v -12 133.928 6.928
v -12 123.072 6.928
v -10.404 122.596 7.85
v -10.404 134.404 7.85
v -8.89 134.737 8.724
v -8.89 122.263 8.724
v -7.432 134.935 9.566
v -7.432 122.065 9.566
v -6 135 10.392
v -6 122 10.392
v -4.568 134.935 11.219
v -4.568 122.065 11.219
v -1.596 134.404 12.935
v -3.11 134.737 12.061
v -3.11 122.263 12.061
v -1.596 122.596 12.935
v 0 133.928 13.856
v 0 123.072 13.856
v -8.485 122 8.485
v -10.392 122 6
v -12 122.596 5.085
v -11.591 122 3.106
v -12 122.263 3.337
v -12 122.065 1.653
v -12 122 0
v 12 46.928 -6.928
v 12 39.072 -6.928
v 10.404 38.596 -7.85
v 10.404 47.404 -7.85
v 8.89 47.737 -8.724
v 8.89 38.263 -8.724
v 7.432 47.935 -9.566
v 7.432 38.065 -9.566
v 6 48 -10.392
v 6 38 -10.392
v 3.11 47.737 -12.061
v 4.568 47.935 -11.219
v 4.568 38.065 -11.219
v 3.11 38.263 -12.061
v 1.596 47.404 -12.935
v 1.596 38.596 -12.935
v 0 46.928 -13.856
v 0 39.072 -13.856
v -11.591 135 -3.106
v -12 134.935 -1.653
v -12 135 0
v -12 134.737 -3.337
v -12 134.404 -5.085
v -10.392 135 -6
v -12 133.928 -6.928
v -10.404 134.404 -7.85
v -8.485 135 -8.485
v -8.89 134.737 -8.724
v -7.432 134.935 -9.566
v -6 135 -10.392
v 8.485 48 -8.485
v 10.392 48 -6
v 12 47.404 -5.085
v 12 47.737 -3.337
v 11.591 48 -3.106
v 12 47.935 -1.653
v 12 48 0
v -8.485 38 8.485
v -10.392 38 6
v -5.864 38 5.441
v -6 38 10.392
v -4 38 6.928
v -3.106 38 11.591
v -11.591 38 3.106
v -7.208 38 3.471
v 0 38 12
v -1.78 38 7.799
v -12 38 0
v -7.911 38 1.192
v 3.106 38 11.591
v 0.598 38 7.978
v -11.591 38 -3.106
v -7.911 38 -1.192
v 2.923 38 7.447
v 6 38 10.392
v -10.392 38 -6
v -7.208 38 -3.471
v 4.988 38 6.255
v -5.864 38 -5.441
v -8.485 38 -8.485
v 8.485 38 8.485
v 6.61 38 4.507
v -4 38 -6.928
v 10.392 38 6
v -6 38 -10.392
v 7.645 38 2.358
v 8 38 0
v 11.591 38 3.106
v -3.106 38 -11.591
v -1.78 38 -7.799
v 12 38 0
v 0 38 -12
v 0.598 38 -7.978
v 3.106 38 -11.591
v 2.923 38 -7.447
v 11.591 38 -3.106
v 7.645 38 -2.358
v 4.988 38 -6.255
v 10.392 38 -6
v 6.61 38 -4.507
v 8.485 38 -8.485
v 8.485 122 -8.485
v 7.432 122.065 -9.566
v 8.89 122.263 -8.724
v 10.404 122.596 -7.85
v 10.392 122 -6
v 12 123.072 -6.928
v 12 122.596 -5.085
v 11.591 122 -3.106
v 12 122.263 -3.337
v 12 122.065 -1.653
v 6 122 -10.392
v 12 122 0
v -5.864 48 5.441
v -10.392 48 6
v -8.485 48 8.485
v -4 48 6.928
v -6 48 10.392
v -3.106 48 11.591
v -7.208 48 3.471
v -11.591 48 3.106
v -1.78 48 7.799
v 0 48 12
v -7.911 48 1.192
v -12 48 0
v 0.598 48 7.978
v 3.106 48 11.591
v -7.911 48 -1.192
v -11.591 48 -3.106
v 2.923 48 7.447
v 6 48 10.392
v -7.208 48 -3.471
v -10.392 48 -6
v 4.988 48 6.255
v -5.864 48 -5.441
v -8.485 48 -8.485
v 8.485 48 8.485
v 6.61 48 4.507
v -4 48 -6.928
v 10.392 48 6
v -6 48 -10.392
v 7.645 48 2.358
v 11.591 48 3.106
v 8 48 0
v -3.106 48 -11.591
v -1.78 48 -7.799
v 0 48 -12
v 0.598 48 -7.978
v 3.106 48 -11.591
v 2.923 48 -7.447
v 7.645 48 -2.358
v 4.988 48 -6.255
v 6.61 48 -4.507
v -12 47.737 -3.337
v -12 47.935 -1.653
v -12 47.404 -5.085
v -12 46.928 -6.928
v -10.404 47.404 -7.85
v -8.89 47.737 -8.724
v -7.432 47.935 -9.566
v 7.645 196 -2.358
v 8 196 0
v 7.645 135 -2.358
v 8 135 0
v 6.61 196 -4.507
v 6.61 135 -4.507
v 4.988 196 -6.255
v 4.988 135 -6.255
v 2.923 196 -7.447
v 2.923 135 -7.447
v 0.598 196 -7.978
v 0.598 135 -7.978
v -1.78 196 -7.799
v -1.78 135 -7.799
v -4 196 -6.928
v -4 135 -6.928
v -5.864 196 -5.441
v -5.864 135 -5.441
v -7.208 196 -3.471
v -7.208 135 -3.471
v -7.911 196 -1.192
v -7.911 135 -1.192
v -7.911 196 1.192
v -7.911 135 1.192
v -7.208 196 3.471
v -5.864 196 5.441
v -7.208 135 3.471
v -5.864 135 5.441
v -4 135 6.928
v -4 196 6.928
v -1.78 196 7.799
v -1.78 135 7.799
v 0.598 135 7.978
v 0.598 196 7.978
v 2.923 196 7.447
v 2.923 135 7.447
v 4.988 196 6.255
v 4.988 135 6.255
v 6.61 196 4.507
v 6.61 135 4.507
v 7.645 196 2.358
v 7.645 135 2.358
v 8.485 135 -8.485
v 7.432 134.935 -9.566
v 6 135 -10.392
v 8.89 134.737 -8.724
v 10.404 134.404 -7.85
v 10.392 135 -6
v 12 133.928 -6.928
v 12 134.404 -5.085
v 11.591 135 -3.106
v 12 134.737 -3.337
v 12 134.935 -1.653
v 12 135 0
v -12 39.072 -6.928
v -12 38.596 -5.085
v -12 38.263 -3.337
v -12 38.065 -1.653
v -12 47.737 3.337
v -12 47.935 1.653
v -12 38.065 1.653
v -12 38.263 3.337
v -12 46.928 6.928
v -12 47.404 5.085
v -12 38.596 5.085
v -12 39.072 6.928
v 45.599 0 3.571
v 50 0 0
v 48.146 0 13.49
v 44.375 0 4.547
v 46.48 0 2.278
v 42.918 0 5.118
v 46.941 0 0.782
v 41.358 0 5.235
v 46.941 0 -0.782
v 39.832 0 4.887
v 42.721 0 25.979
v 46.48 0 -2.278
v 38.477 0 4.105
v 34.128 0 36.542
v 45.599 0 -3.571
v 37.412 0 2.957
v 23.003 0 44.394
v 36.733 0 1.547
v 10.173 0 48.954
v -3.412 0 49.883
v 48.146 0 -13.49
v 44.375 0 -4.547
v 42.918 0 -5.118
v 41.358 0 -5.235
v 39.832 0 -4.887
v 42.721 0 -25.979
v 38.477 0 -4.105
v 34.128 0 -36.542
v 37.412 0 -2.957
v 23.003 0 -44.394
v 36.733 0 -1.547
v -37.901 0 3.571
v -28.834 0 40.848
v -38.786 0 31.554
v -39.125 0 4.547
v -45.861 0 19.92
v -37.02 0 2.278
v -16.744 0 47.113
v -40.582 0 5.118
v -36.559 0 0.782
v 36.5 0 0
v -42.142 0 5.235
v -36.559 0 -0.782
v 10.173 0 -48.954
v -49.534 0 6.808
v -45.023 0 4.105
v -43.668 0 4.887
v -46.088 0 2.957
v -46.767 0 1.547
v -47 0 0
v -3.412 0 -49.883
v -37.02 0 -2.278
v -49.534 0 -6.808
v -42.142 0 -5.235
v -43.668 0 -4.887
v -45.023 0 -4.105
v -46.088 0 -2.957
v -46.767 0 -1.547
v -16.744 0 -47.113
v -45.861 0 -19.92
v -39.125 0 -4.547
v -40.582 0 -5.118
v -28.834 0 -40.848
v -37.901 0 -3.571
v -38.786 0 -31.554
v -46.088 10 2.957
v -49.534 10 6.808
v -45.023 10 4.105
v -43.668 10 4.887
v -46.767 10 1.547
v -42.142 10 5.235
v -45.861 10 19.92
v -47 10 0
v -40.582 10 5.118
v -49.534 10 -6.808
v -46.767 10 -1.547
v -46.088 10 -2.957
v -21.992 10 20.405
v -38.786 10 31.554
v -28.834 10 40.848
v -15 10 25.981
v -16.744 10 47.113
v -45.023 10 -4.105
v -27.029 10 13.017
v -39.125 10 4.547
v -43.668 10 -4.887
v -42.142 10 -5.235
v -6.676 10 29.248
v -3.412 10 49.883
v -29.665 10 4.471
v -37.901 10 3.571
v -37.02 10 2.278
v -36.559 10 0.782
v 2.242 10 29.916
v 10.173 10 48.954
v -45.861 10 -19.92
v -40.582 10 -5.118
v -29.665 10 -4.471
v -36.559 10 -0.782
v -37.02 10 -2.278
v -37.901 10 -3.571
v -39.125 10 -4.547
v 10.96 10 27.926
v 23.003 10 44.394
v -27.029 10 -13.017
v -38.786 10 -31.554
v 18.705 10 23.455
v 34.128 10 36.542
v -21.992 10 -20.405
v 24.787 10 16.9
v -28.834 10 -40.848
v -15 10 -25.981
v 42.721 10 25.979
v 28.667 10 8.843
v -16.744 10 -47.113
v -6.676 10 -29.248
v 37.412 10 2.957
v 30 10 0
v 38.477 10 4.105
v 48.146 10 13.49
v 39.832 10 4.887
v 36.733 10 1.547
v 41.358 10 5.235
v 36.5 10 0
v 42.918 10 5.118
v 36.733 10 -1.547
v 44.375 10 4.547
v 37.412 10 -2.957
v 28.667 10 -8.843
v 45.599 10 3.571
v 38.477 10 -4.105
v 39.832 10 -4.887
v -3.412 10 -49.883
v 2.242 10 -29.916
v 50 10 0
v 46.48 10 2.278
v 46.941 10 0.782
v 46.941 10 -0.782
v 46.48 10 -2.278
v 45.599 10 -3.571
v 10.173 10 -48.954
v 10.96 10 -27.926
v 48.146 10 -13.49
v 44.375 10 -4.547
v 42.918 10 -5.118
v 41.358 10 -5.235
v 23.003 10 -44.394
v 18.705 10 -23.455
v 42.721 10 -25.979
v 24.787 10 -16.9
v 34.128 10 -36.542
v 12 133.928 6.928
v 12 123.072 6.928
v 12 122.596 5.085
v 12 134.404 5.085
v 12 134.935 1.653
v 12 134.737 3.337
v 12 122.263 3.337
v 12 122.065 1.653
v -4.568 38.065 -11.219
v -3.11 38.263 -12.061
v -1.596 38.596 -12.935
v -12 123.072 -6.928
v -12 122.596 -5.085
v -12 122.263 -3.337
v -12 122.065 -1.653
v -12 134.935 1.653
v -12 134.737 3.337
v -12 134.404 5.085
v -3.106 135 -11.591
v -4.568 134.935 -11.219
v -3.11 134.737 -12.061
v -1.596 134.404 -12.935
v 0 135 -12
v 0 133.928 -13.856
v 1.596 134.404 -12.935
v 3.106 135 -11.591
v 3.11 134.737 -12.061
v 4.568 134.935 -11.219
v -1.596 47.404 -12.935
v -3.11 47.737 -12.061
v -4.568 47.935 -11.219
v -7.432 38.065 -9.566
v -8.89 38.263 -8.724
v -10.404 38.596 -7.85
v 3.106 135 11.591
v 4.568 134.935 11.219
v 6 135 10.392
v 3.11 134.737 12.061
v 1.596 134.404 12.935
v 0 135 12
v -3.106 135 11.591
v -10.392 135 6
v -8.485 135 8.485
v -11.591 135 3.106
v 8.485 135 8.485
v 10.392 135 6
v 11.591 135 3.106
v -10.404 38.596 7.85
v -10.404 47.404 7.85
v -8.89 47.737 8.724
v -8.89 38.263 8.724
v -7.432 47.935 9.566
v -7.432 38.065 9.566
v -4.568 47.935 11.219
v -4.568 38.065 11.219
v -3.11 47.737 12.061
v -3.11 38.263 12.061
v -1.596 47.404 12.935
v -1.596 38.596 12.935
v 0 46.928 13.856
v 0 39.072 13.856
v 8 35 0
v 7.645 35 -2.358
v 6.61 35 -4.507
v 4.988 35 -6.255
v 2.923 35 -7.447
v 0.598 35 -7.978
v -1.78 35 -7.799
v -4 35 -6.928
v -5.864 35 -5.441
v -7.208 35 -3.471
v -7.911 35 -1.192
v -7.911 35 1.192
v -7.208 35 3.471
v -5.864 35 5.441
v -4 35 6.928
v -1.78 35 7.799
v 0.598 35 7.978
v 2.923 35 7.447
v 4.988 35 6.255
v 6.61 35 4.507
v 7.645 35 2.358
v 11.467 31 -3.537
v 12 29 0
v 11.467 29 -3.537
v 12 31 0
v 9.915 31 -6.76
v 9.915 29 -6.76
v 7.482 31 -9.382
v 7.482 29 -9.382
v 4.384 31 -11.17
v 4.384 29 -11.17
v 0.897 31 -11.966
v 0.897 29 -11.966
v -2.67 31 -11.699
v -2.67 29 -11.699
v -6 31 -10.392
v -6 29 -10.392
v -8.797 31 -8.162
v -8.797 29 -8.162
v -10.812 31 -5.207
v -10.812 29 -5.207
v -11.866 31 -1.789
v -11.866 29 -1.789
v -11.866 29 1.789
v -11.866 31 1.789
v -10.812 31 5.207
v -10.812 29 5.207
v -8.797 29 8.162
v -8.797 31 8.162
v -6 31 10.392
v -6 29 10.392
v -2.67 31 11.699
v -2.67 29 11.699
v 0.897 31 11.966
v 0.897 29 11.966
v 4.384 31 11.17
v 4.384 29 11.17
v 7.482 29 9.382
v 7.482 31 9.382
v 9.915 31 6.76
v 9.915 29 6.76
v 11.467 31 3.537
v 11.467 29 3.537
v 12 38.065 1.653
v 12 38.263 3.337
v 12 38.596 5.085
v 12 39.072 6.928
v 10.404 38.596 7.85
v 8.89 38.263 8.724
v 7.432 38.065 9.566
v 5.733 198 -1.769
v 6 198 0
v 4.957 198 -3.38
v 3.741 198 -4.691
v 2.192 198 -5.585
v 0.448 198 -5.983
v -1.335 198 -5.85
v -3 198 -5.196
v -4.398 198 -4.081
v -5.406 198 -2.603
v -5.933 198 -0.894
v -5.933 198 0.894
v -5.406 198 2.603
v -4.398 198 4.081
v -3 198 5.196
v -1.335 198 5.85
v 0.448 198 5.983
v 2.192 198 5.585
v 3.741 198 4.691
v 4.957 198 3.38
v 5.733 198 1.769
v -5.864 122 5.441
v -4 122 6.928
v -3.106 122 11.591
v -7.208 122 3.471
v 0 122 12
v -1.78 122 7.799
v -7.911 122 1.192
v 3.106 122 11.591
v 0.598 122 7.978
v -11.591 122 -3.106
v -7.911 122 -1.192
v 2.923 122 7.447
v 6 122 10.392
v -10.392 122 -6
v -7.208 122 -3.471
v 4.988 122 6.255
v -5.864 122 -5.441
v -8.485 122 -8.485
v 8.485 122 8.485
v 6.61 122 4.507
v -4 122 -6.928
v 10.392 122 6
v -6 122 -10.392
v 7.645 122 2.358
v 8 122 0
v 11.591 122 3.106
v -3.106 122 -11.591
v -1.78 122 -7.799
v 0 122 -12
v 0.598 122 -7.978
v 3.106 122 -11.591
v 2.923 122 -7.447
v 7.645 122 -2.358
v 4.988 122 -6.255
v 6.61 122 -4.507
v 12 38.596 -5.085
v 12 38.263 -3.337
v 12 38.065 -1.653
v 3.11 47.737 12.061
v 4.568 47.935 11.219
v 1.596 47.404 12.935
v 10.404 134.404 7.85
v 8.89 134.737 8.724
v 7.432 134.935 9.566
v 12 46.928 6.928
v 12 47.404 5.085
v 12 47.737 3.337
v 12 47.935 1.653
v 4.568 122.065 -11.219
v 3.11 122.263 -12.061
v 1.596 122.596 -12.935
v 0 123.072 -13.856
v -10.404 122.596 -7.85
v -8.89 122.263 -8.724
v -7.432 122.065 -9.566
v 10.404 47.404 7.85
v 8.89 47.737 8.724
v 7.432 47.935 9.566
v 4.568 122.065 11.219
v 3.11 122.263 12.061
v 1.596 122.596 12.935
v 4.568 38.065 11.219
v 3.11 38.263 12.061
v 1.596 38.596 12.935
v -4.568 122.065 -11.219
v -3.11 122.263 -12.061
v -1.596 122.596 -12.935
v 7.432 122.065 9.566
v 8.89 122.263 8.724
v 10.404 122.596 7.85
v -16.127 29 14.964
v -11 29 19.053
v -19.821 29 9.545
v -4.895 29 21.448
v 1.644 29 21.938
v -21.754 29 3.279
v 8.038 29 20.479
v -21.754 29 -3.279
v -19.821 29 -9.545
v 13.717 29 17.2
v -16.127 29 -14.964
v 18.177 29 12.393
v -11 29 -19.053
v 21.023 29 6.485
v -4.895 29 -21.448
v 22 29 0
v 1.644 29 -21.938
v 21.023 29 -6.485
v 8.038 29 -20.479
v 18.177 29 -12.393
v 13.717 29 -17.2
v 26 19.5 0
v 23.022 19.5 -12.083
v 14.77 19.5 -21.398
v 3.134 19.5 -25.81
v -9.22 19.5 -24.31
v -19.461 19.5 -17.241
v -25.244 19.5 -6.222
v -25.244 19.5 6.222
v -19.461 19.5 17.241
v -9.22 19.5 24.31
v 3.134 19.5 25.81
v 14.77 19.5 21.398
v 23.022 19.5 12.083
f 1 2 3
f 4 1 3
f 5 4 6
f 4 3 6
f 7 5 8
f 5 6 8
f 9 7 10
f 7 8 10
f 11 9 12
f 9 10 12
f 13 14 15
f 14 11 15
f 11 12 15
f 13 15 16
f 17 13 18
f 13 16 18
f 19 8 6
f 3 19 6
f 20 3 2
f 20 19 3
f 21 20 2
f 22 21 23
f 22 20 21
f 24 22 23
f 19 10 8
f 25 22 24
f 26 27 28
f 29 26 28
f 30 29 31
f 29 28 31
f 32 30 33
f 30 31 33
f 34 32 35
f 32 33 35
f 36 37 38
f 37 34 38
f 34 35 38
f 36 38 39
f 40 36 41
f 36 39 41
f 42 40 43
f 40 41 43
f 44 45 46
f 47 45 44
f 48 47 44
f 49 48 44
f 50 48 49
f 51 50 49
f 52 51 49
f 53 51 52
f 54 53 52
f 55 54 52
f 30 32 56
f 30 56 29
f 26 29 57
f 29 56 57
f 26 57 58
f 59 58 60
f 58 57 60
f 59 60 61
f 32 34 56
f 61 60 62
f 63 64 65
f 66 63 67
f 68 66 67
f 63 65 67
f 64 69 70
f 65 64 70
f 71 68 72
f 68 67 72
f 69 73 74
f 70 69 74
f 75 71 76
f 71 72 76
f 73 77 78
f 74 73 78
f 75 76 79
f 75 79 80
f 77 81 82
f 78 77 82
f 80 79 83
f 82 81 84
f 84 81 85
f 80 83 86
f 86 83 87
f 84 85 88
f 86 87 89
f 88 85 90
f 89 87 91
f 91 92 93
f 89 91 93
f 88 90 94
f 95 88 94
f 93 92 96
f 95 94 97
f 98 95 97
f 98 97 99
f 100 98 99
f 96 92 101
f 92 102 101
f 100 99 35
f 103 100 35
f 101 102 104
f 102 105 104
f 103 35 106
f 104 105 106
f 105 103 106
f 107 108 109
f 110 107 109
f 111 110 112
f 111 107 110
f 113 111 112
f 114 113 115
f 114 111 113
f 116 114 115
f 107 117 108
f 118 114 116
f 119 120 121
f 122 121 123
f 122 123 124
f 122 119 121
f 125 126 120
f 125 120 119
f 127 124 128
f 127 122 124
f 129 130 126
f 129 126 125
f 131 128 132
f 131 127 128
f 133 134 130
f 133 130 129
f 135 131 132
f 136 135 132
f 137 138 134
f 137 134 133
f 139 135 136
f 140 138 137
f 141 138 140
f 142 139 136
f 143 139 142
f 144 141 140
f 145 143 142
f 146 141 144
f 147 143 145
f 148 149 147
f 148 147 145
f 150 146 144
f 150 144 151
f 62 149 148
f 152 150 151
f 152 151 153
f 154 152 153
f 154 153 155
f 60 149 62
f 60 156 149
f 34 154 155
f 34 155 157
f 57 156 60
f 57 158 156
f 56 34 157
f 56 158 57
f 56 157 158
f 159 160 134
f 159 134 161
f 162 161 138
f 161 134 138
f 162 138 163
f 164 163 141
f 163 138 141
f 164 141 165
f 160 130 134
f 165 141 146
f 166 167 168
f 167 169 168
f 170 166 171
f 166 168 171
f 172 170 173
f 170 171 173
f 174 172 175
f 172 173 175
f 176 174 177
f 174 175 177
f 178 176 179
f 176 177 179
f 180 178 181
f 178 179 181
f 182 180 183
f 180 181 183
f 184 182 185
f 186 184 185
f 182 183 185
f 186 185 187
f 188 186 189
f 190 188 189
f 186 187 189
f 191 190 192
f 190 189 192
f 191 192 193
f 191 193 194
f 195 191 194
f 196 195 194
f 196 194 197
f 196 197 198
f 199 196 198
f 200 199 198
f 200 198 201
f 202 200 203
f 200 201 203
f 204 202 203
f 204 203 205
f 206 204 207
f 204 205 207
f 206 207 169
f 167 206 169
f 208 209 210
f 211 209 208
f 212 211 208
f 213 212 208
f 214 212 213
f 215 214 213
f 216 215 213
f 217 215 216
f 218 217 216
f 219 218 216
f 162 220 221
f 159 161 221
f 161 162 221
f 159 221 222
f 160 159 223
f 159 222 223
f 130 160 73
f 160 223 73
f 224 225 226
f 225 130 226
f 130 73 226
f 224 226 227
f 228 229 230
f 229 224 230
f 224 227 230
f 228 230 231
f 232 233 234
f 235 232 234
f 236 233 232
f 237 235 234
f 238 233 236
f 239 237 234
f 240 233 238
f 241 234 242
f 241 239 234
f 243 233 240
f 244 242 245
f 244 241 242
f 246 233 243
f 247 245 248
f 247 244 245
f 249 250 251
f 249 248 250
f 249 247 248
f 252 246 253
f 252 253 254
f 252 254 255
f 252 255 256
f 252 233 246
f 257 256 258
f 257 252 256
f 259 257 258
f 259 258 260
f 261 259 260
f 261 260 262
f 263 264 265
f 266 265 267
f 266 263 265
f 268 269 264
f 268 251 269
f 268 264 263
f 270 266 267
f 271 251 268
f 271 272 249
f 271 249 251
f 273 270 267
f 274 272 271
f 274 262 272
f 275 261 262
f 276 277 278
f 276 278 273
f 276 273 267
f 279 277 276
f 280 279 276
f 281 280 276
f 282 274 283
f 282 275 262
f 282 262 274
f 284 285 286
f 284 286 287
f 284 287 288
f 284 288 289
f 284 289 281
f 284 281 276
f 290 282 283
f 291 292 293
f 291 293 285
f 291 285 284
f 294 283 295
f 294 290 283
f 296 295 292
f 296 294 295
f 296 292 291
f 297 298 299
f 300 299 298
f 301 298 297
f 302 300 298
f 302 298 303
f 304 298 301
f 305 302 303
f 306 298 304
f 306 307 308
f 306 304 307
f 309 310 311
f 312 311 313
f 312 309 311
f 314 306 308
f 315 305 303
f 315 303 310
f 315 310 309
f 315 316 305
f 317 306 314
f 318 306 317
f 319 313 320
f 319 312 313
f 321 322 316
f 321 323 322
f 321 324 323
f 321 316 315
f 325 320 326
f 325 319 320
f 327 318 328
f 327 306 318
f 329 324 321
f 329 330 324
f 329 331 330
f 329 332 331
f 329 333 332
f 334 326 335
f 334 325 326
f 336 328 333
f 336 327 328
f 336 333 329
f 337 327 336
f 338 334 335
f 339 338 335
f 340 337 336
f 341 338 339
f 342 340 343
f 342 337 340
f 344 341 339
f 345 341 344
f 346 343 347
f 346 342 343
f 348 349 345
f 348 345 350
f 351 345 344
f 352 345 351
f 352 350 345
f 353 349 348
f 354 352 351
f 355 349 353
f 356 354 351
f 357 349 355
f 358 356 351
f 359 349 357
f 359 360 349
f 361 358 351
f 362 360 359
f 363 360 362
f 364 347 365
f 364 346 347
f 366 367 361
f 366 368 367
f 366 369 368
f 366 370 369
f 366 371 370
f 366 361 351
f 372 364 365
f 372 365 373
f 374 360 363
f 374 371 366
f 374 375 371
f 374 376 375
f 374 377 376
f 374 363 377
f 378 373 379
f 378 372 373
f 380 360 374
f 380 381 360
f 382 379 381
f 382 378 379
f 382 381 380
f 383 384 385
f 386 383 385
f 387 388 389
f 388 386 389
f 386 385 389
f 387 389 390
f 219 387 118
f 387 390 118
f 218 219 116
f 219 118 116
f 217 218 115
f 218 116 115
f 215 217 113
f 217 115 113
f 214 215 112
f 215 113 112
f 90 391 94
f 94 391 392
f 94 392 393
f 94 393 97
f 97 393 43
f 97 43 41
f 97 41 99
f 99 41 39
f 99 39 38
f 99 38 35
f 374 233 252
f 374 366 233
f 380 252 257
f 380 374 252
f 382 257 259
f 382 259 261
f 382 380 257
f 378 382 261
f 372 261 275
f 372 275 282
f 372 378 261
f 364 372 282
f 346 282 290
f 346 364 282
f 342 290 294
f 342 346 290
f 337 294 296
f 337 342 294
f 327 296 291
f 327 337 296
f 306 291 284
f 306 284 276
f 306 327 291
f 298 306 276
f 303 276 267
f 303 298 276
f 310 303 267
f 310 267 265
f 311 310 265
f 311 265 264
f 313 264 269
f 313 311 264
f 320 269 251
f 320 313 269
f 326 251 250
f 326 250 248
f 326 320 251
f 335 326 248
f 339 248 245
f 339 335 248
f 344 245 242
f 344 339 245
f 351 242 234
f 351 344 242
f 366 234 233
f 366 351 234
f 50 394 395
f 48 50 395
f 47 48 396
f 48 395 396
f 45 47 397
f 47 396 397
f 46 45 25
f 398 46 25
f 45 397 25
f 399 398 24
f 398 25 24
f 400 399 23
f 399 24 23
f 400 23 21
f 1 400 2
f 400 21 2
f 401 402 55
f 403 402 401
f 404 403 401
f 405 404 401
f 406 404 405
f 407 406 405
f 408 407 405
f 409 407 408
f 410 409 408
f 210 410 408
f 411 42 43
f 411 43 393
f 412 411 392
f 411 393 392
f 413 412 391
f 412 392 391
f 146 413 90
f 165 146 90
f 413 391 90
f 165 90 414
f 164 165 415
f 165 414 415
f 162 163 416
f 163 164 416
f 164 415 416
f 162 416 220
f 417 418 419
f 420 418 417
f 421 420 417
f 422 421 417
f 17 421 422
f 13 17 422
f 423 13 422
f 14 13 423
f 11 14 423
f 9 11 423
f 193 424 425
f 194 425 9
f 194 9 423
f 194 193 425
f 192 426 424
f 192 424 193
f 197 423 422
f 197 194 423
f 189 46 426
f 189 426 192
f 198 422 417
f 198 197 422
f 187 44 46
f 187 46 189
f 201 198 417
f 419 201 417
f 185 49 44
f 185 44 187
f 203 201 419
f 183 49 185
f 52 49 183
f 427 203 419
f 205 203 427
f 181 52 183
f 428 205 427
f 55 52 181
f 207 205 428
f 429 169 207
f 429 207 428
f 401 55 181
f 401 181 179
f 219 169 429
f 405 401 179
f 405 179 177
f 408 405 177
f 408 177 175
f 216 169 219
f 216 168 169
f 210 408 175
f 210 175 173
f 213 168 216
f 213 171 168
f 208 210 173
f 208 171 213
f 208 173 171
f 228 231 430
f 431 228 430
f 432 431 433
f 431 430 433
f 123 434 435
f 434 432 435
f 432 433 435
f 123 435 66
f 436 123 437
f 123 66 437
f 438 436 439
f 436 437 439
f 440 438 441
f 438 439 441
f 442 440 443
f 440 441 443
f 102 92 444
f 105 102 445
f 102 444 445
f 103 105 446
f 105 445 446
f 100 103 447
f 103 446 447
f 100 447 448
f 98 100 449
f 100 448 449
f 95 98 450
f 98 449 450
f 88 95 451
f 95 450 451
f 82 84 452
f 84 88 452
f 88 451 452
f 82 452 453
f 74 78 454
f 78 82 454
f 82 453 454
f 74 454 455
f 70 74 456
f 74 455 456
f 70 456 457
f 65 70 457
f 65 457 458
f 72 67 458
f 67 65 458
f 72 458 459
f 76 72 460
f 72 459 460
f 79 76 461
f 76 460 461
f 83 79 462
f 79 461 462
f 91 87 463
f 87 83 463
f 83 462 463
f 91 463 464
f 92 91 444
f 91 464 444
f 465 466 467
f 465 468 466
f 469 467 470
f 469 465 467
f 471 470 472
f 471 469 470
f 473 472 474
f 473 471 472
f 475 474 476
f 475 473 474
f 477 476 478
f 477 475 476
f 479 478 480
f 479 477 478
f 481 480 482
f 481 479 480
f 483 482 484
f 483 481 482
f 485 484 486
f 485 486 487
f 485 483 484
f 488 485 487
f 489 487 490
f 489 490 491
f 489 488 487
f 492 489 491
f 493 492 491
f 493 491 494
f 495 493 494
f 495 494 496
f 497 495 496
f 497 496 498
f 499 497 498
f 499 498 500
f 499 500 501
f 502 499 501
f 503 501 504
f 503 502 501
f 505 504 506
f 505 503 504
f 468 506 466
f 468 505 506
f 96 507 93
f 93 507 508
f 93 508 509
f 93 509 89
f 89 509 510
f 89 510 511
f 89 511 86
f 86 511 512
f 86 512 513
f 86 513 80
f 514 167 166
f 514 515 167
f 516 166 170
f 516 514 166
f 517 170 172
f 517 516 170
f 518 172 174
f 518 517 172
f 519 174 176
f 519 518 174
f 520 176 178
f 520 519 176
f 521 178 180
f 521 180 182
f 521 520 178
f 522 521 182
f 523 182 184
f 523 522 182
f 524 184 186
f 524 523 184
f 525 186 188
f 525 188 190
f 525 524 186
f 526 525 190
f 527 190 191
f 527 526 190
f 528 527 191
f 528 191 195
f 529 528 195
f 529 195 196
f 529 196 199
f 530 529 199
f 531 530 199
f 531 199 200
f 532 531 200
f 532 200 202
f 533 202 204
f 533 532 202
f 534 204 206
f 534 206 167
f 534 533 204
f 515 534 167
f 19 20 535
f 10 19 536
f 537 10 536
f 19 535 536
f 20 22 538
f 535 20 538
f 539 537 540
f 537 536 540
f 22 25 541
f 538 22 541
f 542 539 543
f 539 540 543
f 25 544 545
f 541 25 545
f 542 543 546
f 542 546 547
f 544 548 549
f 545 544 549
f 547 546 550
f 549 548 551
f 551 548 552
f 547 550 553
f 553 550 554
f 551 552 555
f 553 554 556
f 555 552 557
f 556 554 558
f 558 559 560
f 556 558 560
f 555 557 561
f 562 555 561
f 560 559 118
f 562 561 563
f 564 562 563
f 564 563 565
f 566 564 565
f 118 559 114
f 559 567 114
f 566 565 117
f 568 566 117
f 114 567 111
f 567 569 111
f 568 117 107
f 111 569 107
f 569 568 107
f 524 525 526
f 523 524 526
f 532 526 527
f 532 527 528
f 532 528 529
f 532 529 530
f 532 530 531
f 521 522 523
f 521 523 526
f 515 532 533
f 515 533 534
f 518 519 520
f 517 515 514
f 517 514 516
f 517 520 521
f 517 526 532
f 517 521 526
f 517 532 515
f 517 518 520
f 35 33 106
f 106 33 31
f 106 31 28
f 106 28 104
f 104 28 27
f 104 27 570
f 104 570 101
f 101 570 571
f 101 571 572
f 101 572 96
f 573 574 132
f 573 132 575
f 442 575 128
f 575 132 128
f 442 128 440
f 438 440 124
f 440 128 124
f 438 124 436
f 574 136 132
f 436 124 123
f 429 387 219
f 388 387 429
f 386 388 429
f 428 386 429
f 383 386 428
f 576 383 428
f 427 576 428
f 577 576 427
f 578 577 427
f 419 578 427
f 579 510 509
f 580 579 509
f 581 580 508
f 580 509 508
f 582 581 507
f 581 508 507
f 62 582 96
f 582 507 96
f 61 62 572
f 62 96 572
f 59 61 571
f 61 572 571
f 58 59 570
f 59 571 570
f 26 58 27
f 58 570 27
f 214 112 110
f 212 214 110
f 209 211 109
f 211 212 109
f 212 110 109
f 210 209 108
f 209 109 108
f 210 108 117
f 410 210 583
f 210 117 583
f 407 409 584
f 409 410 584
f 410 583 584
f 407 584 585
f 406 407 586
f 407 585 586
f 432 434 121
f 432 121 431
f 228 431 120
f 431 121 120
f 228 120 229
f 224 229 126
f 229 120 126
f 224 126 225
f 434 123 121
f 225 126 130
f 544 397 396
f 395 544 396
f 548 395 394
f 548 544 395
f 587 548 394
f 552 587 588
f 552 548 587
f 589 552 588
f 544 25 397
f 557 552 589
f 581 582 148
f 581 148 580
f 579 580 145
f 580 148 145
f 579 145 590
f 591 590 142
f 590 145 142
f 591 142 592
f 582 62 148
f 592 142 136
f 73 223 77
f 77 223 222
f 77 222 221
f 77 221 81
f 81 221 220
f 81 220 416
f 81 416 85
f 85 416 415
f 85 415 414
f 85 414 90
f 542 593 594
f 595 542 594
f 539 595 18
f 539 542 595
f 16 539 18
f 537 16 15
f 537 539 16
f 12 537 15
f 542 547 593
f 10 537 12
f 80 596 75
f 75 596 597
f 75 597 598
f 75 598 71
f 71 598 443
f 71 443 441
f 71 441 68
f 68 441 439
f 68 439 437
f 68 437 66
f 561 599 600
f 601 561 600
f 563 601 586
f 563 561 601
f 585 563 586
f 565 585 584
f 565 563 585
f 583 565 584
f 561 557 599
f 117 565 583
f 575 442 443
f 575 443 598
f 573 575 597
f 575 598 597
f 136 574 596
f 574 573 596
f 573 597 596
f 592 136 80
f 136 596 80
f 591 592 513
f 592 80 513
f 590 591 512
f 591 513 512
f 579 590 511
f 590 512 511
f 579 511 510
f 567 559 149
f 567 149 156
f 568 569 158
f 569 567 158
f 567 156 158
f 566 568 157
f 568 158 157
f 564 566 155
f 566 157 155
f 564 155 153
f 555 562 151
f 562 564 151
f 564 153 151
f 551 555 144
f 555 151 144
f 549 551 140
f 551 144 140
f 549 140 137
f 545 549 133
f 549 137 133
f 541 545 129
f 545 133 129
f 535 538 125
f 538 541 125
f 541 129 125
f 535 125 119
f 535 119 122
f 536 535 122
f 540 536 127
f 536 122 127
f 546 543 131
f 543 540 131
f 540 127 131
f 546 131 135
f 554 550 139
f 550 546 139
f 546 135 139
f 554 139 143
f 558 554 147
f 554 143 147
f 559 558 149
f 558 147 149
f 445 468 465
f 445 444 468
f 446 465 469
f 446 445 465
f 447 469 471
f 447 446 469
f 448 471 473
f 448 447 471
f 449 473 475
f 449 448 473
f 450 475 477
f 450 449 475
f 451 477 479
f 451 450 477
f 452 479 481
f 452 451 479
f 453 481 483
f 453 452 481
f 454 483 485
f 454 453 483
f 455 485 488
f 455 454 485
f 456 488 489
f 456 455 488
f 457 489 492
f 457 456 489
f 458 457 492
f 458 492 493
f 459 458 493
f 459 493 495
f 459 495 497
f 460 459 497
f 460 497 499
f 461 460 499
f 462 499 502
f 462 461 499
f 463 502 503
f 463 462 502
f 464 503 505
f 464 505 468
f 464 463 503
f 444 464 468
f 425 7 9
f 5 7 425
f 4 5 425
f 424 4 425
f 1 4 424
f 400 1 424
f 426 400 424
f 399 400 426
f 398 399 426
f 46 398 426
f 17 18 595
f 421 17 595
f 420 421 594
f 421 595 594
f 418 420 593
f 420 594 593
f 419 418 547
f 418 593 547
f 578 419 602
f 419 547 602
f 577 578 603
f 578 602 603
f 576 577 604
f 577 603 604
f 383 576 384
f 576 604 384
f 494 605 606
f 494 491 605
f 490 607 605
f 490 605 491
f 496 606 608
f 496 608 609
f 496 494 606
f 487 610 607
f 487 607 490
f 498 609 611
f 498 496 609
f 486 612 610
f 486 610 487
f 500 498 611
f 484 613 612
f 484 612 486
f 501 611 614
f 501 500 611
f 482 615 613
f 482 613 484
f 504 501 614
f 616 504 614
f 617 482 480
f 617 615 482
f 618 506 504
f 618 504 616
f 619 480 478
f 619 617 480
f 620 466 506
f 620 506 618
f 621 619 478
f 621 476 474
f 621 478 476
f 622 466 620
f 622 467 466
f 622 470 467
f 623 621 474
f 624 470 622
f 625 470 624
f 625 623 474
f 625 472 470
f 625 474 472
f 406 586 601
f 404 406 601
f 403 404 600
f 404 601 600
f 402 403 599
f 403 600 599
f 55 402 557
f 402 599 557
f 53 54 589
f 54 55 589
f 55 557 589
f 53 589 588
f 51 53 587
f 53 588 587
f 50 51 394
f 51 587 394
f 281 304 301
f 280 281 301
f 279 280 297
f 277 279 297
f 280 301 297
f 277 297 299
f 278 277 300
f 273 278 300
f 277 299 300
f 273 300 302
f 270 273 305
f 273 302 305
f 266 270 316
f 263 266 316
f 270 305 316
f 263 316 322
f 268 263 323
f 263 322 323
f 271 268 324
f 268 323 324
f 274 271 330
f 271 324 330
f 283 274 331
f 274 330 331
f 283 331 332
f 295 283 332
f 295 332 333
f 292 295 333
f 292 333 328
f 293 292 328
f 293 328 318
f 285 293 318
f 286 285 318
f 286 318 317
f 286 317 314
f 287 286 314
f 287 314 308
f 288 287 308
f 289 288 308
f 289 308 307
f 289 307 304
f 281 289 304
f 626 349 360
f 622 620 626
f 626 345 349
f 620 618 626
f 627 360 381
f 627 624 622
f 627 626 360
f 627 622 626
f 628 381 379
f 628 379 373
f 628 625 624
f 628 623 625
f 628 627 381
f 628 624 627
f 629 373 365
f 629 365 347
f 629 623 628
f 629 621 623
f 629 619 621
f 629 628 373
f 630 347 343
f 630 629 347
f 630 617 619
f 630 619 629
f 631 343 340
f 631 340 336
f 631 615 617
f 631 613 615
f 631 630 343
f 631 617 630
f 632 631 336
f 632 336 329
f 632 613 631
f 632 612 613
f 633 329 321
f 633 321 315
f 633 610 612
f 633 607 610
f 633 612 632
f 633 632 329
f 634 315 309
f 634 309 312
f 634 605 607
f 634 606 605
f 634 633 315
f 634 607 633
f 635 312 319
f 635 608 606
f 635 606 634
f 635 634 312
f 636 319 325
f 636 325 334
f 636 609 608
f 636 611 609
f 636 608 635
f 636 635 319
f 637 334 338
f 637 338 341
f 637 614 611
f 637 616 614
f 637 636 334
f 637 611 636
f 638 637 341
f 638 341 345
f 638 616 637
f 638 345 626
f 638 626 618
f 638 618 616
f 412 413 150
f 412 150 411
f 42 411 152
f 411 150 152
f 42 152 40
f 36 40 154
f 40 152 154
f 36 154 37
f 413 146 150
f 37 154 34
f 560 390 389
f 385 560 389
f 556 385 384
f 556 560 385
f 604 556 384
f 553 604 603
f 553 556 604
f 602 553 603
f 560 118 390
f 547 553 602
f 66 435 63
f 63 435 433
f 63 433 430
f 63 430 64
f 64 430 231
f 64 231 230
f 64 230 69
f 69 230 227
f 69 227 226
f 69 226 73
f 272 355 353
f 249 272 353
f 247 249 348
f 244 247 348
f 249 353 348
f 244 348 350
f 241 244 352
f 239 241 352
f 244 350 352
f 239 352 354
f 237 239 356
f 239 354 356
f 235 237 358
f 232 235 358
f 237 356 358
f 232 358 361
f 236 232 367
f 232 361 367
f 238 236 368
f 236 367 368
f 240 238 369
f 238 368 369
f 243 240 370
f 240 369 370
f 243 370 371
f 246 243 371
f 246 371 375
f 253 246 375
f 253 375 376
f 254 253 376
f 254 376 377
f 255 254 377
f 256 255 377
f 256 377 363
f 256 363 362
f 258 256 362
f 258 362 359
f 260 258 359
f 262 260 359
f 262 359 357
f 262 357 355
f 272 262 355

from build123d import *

# Parameters (mm, degrees)
EXTRUDE_1_DEPTH     = 10
EXTRUDE_2_DEPTH     = 13
SKETCH_5_R          = 5.25
CUT_EXTRUDE_1_DEPTH = 11


with BuildPart() as part:
    # Эскиз1 → Повернуть1 (revolve)
    with BuildSketch(Plane.XY, mode=Mode.PRIVATE) as revolve_1_sk:
        Polygon((0, 0), (-50, 0), (-50, 10), (-30, 10), (-22, 29), (-12, 29), (-12, 31), (-8, 35), (-8, 38), (-8, 48), (-8, 196), (-6, 198), (0, 198), align=None)
    revolve(revolve_1_sk.sketch.rotate(Axis((0, 0, 0), (0, 1, 0)), 180), axis=Axis((0, 0, 0), (0, 1, 0)))  # turned: the seam where the file's is

    # Эскиз2 → Бобышка-Вытянуть1 (add)
    with BuildSketch(Plane(origin=(0, 38, 0), x_dir=(1, 0, 0), z_dir=(0, 1, 0))):
        Polygon((0, 13.856406461), (-12, 6.92820323), (-12, -6.92820323), (0, -13.856406461), (12, -6.92820323), (12, 6.92820323), align=None)
    extrude(amount=EXTRUDE_1_DEPTH)

    # Эскиз3 → Бобышка-Вытянуть2 (add)
    with BuildSketch(Plane(origin=(0, 122, 0), x_dir=(1, 0, 0), z_dir=(0, 1, 0))):
        Polygon((12, 6.92820323), (0, 13.856406461), (-12, 6.92820323), (-12, -6.92820323), (0, -13.856406461), (12, -6.92820323), align=None)
    extrude(amount=EXTRUDE_2_DEPTH)

    # Эскиз4 → Вырез-Повернуть2 (revolve, cut)
    with BuildSketch(Plane.XY, mode=Mode.PRIVATE) as cut_revolve_2_sk:
        Polygon((-23.258330249, 135), (-12, 135), (-23.258330249, 128.5), align=None)
        Polygon((-23.258330249, 122), (-23.258330249, 128.5), (-12, 122), align=None)
        Polygon((-20.660254038, 48), (-20.660254038, 43), (-12, 48), align=None)
        Polygon((-20.660254038, 43), (-20.660254038, 38), (-12, 38), align=None)
    revolve(cut_revolve_2_sk.sketch.rotate(Axis((0, 198, 0), (0, -1, 0)), 180), axis=Axis((0, 198, 0), (0, -1, 0)), mode=Mode.SUBTRACT)  # turned: the seam where the file's is

    # Эскиз5 → Вырез-Вытянуть1 (cut, through all)
    with BuildSketch(Plane(origin=(0, 10, 0), x_dir=(1, 0, 0), z_dir=(0, 1, 0))):
        with Locations(Location((-41.75, 0, 0), (0, 0, 180))):  # turned: the seam where the file's is
            Circle(SKETCH_5_R)
        with Locations(Location((41.75, 0, 0), (0, 0, 180))):  # turned: the seam where the file's is
            Circle(SKETCH_5_R)
    extrude(amount=-CUT_EXTRUDE_1_DEPTH, mode=Mode.SUBTRACT)


solid = part.part
